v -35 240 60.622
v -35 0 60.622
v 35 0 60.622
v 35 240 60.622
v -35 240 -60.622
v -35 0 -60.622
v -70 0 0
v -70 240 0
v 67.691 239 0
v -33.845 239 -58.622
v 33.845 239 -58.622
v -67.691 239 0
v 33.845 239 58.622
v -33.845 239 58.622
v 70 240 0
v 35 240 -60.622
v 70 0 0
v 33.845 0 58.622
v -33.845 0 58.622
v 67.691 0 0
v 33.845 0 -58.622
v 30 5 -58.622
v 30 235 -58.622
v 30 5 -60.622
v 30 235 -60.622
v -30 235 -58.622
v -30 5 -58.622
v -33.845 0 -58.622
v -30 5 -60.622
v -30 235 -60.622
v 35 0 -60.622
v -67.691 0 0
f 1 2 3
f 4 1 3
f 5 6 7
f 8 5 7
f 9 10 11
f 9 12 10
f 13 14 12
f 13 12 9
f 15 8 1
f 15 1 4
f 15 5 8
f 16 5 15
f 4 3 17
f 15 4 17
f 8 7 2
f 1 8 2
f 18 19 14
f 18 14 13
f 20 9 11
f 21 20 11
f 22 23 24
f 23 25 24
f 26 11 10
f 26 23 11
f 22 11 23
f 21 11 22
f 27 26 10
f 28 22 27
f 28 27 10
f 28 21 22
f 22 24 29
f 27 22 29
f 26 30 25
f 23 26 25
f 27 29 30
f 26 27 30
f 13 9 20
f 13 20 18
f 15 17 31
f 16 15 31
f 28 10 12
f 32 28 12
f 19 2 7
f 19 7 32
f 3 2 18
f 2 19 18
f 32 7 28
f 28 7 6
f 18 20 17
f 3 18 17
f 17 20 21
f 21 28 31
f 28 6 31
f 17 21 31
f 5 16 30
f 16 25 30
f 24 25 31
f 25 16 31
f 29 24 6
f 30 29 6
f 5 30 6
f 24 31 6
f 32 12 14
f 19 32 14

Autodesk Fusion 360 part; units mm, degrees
sketch "side" plane through (0, 0, 0) normal (0, 1, 0) x (1, 0, 0)
  line L0 (35, -60.6218) -> (70, 0)
  line L1 (70, 0) -> (35, 60.6218)
  line L2 (35, 60.6218) -> (-35, 60.6218)
  line L3 (-35, 60.6218) -> (-70, 0)
  line L4 (-70, 0) -> (-35, -60.6218)
  line L5 (-35, -60.6218) -> (35, -60.6218)
  dimension "d1" = 70
extrude "Extrude1" add sketch "side" along normal blind 240
sketch "2mm offset cap" plane through (0, 0, 0) normal (0, -1, 0) x (1, 0, 0)
  line L0 (35, 60.6218) -> (-35, 60.6218)
  line L1 (-35, 60.6218) -> (-70, 0)
  line L2 (-70, 0) -> (-35, -60.6218)
  line L3 (-35, -60.6218) -> (35, -60.6218)
  line L4 (35, -60.6218) -> (70, 0)
  line L5 (70, 0) -> (35, 60.6218)
  line L6 (-35, 60.6218) -> (35, 60.6218)
  line L7 (70, 0) -> (35, 60.6218)
  line L8 (70, 0) -> (35, -60.6218)
  line L9 (35, -60.6218) -> (-35, -60.6218)
  line L10 (-35, -60.6218) -> (-70, 0)
  line L11 (-70, 0) -> (-35, 60.6218)
  line L12 (-33.8453, -58.6218) -> (-67.6906, 0)
  line L13 (-67.6906, 0) -> (-33.8453, 58.6218)
  line L14 (-33.8453, 58.6218) -> (33.8453, 58.6218)
  line L15 (67.6906, 0) -> (33.8453, 58.6218)
  line L16 (67.6906, 0) -> (33.8453, -58.6218)
  line L17 (33.8453, -58.6218) -> (-33.8453, -58.6218)
  dimension "d4" = 2
extrude "Extrude2" cut sketch "2mm offset cap" against normal blind 239 contours L12 L13 L14 L15 L16 L17
sketch "opening for tubes" plane through (0, 0, -60.6218) normal (0, 0, -1) x (1, 0, 0)
  line L0 (35, 0) -> (-35, 0)
  line L1 (-35, 0) -> (-35, -240)
  line L2 (-35, -240) -> (35, -240)
  line L3 (35, -240) -> (35, 0)
  line L4 (-35, -240) -> (35, -240)
  line L5 (35, -240) -> (35, 0)
  line L6 (35, 0) -> (-35, 0)
  line L7 (-35, 0) -> (-35, -240)
  line L8 (30, -235) -> (30, -5)
  line L9 (30, -5) -> (-30, -5)
  line L10 (-30, -5) -> (-30, -235)
  line L11 (-30, -235) -> (30, -235)
  dimension "d7" = -5
extrude "Extrude4" cut sketch "opening for tubes" against normal blind 2 contours L8 L9 L10 L11
